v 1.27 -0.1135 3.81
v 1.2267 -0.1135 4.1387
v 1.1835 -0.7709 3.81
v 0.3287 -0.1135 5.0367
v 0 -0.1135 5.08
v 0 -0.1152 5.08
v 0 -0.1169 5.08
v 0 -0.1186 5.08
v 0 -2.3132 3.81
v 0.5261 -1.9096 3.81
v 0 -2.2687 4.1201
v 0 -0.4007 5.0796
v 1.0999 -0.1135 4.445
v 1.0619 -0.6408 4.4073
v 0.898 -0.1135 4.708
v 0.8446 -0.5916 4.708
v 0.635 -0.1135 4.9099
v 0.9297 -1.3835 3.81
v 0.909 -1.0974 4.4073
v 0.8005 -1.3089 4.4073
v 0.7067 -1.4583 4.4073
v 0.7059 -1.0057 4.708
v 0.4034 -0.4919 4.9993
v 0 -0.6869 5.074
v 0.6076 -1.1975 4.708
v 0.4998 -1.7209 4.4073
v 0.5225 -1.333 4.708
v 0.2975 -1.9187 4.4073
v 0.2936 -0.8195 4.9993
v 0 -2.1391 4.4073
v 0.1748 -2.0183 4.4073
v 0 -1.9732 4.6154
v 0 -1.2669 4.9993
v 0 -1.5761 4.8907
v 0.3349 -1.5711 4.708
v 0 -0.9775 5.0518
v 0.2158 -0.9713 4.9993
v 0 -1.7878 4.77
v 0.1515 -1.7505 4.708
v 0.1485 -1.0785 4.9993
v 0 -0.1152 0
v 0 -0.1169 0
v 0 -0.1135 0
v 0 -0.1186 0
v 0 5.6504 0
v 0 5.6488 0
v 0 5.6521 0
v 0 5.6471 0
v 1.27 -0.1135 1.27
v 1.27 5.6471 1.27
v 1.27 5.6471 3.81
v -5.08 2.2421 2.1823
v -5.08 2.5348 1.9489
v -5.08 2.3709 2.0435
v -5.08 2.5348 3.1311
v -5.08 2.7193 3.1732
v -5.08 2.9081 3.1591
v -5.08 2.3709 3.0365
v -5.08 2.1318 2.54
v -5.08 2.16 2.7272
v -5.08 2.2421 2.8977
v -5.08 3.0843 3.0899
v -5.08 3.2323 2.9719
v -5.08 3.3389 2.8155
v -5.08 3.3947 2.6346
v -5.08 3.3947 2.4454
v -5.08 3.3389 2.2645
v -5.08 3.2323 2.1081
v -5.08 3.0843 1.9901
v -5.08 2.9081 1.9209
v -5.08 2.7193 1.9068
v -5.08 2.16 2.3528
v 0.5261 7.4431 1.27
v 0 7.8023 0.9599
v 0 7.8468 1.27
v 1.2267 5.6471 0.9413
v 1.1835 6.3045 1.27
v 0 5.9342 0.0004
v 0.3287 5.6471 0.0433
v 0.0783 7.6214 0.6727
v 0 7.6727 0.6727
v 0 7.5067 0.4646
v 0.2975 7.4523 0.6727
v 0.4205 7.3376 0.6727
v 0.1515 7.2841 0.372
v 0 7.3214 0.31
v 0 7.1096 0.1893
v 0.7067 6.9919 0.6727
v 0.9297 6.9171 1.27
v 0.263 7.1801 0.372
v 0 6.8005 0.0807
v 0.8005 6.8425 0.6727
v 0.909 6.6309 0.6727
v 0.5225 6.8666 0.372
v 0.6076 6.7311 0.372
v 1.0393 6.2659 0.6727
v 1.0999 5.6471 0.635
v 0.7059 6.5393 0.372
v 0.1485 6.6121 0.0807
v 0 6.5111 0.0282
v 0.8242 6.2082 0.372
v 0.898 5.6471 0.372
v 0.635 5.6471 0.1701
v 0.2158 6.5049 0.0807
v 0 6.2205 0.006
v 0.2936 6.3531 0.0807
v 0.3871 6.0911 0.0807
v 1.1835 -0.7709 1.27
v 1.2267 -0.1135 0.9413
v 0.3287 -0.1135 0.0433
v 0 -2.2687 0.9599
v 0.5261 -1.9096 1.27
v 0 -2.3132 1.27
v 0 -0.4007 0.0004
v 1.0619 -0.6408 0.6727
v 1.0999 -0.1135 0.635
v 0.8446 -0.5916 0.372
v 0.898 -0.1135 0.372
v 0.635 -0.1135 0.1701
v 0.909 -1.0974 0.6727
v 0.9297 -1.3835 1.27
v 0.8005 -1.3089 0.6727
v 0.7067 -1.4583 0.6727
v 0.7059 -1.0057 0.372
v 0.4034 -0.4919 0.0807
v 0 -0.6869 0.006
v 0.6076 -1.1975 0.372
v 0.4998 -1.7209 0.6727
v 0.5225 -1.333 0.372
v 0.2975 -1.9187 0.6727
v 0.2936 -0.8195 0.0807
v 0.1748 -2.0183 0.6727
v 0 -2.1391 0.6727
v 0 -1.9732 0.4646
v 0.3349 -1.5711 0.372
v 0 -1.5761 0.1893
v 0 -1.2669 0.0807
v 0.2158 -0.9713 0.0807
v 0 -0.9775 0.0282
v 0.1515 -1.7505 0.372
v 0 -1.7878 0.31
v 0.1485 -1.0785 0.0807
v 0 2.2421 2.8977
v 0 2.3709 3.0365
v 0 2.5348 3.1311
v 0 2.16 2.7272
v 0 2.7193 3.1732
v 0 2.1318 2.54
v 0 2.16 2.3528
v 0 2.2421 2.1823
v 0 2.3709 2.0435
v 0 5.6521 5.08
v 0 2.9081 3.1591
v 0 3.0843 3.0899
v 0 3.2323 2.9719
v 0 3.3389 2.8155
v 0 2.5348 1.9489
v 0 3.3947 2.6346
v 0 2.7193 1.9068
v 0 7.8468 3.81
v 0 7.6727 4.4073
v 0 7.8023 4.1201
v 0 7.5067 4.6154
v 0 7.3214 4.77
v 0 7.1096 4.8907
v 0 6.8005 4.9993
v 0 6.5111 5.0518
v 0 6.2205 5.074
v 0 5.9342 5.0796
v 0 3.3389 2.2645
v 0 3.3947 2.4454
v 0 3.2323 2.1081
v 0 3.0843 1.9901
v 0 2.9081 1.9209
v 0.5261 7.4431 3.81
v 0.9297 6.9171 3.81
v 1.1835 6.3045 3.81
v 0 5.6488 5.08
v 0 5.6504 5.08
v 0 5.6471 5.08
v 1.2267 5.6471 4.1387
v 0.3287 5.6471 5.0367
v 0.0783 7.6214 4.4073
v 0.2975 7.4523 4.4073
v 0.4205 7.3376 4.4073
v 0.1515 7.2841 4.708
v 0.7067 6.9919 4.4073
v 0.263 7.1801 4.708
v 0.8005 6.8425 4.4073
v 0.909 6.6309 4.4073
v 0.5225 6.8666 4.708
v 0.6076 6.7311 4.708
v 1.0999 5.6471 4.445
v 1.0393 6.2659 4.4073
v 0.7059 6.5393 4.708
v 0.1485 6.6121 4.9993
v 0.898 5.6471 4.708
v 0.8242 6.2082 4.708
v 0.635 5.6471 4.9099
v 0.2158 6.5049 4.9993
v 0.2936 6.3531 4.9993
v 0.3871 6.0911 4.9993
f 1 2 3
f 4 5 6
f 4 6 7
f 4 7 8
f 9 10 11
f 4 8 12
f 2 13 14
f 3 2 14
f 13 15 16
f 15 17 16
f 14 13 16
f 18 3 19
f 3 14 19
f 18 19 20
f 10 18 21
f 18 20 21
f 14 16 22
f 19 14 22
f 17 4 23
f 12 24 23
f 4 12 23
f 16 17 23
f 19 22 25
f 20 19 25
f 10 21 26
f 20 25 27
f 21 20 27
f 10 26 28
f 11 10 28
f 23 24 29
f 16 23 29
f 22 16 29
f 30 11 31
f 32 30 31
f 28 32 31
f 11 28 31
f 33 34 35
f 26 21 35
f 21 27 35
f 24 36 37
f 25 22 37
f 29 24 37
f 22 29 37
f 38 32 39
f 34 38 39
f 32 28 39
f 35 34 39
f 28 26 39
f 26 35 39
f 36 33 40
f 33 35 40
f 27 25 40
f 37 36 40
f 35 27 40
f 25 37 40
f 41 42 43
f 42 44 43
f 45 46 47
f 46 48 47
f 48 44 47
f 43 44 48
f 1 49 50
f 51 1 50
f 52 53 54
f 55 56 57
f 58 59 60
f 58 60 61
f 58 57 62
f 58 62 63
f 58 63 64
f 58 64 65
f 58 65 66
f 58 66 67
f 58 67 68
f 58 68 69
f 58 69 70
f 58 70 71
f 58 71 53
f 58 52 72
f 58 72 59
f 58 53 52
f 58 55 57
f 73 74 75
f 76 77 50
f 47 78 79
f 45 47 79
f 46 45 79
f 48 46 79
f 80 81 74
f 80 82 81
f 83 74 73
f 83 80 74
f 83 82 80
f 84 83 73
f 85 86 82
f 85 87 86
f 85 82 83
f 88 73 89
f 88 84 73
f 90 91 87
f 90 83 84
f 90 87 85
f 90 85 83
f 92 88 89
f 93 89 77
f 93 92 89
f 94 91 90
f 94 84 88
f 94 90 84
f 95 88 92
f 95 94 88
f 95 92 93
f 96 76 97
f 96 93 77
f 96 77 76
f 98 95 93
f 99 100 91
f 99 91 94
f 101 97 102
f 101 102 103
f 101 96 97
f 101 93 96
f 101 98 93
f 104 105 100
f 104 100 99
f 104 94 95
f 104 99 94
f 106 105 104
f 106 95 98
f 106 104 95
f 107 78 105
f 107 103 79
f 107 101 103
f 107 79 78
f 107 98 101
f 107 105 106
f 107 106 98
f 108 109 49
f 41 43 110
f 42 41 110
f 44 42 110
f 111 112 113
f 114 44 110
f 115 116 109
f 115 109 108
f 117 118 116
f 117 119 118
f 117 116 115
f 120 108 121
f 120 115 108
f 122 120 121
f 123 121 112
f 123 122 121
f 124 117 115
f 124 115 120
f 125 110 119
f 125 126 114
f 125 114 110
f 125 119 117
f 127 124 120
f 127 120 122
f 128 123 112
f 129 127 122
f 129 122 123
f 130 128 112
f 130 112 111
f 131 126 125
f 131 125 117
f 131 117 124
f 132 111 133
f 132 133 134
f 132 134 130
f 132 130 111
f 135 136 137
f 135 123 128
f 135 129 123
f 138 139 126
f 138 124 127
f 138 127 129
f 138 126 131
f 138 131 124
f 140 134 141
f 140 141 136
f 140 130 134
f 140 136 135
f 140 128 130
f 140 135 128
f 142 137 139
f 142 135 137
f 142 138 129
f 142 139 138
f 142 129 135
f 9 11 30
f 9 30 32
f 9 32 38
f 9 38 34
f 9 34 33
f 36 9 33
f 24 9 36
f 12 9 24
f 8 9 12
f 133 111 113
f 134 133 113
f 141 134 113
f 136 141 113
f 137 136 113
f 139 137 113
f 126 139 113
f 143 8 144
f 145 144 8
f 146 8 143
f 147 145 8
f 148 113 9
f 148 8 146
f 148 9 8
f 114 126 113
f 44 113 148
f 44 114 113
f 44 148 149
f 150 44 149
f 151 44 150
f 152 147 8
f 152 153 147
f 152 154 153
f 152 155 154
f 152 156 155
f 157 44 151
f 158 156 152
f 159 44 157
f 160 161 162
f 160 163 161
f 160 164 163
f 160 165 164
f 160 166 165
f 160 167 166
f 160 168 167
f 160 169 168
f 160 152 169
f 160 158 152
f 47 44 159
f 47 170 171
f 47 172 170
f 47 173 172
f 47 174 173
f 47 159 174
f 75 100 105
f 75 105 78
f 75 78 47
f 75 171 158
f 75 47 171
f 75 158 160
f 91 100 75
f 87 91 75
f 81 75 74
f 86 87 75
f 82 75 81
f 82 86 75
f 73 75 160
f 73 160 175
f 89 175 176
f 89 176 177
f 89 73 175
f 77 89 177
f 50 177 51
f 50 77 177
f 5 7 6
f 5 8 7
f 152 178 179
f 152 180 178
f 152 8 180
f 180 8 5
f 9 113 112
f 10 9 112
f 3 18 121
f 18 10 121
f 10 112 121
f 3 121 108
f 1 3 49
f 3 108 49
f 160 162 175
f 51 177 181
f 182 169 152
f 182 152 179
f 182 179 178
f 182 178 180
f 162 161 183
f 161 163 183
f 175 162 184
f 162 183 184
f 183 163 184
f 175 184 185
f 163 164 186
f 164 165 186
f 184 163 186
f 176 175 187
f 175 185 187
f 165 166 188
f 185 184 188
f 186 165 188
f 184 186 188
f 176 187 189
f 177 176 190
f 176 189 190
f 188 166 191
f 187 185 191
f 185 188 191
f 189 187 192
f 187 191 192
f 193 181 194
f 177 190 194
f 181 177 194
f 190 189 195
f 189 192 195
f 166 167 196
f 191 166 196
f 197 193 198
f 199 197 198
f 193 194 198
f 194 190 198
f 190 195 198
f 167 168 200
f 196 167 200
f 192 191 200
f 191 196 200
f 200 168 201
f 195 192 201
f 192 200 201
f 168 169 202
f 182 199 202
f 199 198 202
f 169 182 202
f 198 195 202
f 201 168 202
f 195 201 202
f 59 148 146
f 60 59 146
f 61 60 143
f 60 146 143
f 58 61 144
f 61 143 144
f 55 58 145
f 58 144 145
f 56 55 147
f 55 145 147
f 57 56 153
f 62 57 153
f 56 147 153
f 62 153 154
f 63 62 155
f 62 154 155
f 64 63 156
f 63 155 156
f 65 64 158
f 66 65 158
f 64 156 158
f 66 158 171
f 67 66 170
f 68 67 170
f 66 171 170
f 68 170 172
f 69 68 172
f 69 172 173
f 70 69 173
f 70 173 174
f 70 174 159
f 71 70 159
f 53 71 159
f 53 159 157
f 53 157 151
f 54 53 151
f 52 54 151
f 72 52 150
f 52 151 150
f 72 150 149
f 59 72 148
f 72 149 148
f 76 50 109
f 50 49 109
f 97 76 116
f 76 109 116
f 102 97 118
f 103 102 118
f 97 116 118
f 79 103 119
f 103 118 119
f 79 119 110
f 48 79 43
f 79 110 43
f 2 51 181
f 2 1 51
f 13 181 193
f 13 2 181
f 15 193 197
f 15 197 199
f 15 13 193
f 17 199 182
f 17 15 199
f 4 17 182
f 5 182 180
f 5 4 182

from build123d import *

# Parameters (mm, degrees)
F0_W        = 1.27
F0_H        = 10.16
F1_DEPTH    = 5.08
F2_T1_DEPTH = 16.0785226281
F3_R        = 1.26999
F4_R        = 0.635
F5_DEPTH    = 5.08


# Not quite as in the source:
# - a fillet or chamfer that OpenCascade refuses, or shapes differently, is made with other operations: its cross-section is extruded or revolved along the edge and cut away or added
# - a fillet or chamfer is up to 0.001 mm smaller than in the source, because OpenCascade refuses the exact size


with BuildPart() as f1:
    # F0 (on Top) → F1 (new body)
    with BuildSketch(Plane.XY):
        with Locations((0.635, 2.7667839336)):
            Rectangle(F0_W, F0_H)
    extrude(amount=F1_DEPTH)

    # F2: fillet of radius 2.54 on 2 edges, made by hand

    # F2_s2 → F2_t1 (cut)
    with BuildSketch(Plane.XY.offset(-5.499261314)):
        with BuildLine():
            ThreePointArc((0, 7.8467839336), (0.9297045256, 6.9170794079), (1.27, 5.6470794079))
            Line((1.27, 5.6470794079), (1.27, 7.8467839336))
            Line((1.27, 7.8467839336), (0, 7.8467839336))
        make_face()
        with BuildLine():
            ThreePointArc((0, -2.3132160664), (0.9297045256, -1.3835115408), (1.27, -0.1135115408))
            Line((1.27, -0.1135115408), (1.27, -2.3132160664))
            Line((1.27, -2.3132160664), (0, -2.3132160664))
        make_face()
    extrude(amount=F2_T1_DEPTH, mode=Mode.SUBTRACT)

    # F3 (radius 1.27 in the source; OpenCascade refuses exactly that, so slightly less here)
    f3_edges = [f1.edges().sort_by_distance(p)[0] for p in [
        (0.929705, 6.917079, 5.08),
        (1.27, 2.766784, 5.08),
        (0.929705, -1.383512, 5.08),
        (0.929705, 6.917079, 0),
        (0.929705, -1.383512, 0),
        (1.27, 2.766784, 0),
    ]]
    fillet(f3_edges, radius=F3_R)

    # F4 (on face) → F5 (join)
    with BuildSketch(Plane(origin=(0, 0, 0), x_dir=(0, -1, 0), z_dir=(-1, 0, 0))):
        with Locations((-2.7667839336, 2.54)):
            Circle(F4_R)
    extrude(amount=F5_DEPTH)


solid = f1.part
